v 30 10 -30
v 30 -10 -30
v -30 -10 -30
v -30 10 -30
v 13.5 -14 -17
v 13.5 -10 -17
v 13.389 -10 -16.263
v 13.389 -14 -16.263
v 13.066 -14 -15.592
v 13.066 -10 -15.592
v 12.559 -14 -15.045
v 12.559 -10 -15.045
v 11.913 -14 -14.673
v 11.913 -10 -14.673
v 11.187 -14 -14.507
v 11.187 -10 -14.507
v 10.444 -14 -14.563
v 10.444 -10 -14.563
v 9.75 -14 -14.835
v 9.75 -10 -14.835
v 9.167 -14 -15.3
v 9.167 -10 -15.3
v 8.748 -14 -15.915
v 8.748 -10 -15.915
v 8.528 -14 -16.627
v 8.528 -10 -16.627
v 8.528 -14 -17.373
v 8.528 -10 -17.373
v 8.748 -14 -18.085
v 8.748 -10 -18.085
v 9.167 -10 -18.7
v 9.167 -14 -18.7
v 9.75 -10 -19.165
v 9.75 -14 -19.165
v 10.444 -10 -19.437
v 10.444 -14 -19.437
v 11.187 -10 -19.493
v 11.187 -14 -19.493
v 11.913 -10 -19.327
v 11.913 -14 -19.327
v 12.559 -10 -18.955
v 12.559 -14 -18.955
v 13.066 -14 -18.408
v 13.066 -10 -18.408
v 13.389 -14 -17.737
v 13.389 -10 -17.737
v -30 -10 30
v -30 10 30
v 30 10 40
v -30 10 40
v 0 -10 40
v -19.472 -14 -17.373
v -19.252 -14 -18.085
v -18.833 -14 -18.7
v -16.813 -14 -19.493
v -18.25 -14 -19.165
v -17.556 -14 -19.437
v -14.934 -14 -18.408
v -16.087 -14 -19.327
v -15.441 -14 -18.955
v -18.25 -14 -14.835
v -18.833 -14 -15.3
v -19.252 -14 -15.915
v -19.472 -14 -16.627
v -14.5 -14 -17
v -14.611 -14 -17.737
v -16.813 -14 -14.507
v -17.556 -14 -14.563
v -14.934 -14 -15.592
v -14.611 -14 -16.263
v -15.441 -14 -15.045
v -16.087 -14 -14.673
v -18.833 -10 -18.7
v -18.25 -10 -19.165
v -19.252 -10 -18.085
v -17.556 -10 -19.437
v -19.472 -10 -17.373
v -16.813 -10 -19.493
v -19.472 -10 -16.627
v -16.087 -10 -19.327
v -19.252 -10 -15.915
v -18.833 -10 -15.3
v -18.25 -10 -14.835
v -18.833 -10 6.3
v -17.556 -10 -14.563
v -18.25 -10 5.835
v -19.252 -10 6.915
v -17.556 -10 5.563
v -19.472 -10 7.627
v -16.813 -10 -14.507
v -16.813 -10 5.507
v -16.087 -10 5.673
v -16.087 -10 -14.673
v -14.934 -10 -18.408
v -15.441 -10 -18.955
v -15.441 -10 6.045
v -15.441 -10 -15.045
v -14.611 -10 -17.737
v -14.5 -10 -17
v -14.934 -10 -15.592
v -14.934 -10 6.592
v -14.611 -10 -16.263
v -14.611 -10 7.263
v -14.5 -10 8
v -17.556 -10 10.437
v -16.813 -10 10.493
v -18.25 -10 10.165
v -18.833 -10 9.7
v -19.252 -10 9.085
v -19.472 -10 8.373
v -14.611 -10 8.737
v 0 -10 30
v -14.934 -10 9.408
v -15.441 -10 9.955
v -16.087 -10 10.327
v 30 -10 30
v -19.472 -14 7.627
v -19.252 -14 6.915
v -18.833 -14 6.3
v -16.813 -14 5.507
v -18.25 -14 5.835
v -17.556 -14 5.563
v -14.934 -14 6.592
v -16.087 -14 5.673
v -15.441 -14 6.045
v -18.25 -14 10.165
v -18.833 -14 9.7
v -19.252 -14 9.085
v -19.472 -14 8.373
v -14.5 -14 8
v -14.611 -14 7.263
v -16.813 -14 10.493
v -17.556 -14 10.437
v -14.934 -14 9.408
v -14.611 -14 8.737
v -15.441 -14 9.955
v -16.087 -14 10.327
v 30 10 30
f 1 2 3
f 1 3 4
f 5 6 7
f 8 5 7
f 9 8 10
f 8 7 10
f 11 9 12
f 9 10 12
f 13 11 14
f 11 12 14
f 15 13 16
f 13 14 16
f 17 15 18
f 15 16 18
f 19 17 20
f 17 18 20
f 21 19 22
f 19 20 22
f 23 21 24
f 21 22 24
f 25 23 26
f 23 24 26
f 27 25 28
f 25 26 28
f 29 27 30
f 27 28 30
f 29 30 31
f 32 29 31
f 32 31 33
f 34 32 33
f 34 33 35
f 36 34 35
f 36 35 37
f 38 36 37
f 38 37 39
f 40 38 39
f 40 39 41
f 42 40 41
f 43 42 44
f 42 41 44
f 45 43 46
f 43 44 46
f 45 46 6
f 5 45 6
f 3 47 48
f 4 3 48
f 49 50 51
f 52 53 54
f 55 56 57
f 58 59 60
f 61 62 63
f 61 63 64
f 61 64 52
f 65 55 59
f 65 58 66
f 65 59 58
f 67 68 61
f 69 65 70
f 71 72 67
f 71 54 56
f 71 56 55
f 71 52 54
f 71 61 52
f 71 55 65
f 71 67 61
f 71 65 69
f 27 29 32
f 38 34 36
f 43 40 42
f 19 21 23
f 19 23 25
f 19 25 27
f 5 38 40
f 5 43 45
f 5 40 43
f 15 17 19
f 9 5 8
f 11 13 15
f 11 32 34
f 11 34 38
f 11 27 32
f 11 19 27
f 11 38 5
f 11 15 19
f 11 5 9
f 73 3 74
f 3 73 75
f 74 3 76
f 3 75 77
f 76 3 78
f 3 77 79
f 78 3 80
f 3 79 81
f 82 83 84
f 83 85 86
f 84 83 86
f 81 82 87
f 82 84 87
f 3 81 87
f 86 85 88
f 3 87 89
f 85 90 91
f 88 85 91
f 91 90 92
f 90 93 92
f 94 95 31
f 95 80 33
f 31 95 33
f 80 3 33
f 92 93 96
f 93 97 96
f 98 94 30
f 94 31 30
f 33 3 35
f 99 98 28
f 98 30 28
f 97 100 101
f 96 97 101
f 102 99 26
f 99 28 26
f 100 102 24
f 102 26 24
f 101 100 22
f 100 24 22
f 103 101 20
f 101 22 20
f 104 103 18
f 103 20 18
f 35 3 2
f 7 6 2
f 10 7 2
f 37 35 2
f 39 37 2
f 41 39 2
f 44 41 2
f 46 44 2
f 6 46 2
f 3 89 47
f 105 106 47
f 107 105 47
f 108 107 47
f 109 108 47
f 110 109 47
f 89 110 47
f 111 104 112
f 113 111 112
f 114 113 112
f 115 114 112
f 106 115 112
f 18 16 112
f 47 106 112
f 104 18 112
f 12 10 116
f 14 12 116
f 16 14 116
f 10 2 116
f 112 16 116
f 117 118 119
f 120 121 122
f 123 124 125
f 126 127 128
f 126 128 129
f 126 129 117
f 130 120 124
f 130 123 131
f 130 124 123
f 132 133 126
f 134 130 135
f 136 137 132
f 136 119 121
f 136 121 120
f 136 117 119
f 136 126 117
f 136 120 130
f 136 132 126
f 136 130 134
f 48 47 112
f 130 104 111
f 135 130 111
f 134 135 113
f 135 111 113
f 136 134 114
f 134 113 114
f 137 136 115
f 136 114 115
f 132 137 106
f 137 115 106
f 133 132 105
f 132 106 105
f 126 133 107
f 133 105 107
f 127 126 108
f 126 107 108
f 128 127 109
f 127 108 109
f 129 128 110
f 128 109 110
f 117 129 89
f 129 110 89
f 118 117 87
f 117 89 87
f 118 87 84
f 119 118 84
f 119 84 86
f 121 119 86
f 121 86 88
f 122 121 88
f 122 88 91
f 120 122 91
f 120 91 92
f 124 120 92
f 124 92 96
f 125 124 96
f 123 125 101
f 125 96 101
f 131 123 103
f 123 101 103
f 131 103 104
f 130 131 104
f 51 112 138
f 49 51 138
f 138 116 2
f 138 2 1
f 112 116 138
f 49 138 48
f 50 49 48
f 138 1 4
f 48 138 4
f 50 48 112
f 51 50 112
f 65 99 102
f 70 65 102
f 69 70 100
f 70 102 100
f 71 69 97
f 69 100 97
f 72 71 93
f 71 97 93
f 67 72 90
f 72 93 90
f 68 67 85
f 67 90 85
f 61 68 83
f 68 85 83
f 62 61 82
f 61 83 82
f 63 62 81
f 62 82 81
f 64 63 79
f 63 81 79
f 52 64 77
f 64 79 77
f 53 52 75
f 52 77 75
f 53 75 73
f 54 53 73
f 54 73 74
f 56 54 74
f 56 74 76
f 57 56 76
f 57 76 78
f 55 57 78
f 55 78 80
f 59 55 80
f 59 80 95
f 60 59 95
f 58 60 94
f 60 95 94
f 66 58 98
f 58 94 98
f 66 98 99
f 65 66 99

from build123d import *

# Parameters (mm, degrees)
F0_W          = 20
F0_H          = 60
F1_DEPTH      = 30
F1_DEPTH_BACK = 30
F3_DEPTH      = 10
F4_R          = 2.5
F5_DEPTH      = 4


with BuildPart() as f1:
    # F0 (on Right) → F1 (new body, two sides)
    with BuildSketch(Plane.YZ) as f1_sk:
        Rectangle(F0_W, F0_H)
    extrude(amount=F1_DEPTH)
    extrude(f1_sk.sketch, amount=-F1_DEPTH_BACK)

    # F2 (on face) → F3 (join)
    with BuildSketch(Plane.XY.offset(30)):
        Polygon((30, 10), (-30, 10), (0, -10), align=None)
    extrude(amount=F3_DEPTH)

    # F4 (on face) → F5 (join)
    with BuildSketch(Plane.XZ.offset(10)):
        with Locations((-17, 8)):
            Circle(F4_R)
        with Locations((-17, -17)):
            Circle(F4_R)
        with Locations((11, -17)):
            Circle(F4_R)
    extrude(amount=F5_DEPTH)


solid = f1.part
